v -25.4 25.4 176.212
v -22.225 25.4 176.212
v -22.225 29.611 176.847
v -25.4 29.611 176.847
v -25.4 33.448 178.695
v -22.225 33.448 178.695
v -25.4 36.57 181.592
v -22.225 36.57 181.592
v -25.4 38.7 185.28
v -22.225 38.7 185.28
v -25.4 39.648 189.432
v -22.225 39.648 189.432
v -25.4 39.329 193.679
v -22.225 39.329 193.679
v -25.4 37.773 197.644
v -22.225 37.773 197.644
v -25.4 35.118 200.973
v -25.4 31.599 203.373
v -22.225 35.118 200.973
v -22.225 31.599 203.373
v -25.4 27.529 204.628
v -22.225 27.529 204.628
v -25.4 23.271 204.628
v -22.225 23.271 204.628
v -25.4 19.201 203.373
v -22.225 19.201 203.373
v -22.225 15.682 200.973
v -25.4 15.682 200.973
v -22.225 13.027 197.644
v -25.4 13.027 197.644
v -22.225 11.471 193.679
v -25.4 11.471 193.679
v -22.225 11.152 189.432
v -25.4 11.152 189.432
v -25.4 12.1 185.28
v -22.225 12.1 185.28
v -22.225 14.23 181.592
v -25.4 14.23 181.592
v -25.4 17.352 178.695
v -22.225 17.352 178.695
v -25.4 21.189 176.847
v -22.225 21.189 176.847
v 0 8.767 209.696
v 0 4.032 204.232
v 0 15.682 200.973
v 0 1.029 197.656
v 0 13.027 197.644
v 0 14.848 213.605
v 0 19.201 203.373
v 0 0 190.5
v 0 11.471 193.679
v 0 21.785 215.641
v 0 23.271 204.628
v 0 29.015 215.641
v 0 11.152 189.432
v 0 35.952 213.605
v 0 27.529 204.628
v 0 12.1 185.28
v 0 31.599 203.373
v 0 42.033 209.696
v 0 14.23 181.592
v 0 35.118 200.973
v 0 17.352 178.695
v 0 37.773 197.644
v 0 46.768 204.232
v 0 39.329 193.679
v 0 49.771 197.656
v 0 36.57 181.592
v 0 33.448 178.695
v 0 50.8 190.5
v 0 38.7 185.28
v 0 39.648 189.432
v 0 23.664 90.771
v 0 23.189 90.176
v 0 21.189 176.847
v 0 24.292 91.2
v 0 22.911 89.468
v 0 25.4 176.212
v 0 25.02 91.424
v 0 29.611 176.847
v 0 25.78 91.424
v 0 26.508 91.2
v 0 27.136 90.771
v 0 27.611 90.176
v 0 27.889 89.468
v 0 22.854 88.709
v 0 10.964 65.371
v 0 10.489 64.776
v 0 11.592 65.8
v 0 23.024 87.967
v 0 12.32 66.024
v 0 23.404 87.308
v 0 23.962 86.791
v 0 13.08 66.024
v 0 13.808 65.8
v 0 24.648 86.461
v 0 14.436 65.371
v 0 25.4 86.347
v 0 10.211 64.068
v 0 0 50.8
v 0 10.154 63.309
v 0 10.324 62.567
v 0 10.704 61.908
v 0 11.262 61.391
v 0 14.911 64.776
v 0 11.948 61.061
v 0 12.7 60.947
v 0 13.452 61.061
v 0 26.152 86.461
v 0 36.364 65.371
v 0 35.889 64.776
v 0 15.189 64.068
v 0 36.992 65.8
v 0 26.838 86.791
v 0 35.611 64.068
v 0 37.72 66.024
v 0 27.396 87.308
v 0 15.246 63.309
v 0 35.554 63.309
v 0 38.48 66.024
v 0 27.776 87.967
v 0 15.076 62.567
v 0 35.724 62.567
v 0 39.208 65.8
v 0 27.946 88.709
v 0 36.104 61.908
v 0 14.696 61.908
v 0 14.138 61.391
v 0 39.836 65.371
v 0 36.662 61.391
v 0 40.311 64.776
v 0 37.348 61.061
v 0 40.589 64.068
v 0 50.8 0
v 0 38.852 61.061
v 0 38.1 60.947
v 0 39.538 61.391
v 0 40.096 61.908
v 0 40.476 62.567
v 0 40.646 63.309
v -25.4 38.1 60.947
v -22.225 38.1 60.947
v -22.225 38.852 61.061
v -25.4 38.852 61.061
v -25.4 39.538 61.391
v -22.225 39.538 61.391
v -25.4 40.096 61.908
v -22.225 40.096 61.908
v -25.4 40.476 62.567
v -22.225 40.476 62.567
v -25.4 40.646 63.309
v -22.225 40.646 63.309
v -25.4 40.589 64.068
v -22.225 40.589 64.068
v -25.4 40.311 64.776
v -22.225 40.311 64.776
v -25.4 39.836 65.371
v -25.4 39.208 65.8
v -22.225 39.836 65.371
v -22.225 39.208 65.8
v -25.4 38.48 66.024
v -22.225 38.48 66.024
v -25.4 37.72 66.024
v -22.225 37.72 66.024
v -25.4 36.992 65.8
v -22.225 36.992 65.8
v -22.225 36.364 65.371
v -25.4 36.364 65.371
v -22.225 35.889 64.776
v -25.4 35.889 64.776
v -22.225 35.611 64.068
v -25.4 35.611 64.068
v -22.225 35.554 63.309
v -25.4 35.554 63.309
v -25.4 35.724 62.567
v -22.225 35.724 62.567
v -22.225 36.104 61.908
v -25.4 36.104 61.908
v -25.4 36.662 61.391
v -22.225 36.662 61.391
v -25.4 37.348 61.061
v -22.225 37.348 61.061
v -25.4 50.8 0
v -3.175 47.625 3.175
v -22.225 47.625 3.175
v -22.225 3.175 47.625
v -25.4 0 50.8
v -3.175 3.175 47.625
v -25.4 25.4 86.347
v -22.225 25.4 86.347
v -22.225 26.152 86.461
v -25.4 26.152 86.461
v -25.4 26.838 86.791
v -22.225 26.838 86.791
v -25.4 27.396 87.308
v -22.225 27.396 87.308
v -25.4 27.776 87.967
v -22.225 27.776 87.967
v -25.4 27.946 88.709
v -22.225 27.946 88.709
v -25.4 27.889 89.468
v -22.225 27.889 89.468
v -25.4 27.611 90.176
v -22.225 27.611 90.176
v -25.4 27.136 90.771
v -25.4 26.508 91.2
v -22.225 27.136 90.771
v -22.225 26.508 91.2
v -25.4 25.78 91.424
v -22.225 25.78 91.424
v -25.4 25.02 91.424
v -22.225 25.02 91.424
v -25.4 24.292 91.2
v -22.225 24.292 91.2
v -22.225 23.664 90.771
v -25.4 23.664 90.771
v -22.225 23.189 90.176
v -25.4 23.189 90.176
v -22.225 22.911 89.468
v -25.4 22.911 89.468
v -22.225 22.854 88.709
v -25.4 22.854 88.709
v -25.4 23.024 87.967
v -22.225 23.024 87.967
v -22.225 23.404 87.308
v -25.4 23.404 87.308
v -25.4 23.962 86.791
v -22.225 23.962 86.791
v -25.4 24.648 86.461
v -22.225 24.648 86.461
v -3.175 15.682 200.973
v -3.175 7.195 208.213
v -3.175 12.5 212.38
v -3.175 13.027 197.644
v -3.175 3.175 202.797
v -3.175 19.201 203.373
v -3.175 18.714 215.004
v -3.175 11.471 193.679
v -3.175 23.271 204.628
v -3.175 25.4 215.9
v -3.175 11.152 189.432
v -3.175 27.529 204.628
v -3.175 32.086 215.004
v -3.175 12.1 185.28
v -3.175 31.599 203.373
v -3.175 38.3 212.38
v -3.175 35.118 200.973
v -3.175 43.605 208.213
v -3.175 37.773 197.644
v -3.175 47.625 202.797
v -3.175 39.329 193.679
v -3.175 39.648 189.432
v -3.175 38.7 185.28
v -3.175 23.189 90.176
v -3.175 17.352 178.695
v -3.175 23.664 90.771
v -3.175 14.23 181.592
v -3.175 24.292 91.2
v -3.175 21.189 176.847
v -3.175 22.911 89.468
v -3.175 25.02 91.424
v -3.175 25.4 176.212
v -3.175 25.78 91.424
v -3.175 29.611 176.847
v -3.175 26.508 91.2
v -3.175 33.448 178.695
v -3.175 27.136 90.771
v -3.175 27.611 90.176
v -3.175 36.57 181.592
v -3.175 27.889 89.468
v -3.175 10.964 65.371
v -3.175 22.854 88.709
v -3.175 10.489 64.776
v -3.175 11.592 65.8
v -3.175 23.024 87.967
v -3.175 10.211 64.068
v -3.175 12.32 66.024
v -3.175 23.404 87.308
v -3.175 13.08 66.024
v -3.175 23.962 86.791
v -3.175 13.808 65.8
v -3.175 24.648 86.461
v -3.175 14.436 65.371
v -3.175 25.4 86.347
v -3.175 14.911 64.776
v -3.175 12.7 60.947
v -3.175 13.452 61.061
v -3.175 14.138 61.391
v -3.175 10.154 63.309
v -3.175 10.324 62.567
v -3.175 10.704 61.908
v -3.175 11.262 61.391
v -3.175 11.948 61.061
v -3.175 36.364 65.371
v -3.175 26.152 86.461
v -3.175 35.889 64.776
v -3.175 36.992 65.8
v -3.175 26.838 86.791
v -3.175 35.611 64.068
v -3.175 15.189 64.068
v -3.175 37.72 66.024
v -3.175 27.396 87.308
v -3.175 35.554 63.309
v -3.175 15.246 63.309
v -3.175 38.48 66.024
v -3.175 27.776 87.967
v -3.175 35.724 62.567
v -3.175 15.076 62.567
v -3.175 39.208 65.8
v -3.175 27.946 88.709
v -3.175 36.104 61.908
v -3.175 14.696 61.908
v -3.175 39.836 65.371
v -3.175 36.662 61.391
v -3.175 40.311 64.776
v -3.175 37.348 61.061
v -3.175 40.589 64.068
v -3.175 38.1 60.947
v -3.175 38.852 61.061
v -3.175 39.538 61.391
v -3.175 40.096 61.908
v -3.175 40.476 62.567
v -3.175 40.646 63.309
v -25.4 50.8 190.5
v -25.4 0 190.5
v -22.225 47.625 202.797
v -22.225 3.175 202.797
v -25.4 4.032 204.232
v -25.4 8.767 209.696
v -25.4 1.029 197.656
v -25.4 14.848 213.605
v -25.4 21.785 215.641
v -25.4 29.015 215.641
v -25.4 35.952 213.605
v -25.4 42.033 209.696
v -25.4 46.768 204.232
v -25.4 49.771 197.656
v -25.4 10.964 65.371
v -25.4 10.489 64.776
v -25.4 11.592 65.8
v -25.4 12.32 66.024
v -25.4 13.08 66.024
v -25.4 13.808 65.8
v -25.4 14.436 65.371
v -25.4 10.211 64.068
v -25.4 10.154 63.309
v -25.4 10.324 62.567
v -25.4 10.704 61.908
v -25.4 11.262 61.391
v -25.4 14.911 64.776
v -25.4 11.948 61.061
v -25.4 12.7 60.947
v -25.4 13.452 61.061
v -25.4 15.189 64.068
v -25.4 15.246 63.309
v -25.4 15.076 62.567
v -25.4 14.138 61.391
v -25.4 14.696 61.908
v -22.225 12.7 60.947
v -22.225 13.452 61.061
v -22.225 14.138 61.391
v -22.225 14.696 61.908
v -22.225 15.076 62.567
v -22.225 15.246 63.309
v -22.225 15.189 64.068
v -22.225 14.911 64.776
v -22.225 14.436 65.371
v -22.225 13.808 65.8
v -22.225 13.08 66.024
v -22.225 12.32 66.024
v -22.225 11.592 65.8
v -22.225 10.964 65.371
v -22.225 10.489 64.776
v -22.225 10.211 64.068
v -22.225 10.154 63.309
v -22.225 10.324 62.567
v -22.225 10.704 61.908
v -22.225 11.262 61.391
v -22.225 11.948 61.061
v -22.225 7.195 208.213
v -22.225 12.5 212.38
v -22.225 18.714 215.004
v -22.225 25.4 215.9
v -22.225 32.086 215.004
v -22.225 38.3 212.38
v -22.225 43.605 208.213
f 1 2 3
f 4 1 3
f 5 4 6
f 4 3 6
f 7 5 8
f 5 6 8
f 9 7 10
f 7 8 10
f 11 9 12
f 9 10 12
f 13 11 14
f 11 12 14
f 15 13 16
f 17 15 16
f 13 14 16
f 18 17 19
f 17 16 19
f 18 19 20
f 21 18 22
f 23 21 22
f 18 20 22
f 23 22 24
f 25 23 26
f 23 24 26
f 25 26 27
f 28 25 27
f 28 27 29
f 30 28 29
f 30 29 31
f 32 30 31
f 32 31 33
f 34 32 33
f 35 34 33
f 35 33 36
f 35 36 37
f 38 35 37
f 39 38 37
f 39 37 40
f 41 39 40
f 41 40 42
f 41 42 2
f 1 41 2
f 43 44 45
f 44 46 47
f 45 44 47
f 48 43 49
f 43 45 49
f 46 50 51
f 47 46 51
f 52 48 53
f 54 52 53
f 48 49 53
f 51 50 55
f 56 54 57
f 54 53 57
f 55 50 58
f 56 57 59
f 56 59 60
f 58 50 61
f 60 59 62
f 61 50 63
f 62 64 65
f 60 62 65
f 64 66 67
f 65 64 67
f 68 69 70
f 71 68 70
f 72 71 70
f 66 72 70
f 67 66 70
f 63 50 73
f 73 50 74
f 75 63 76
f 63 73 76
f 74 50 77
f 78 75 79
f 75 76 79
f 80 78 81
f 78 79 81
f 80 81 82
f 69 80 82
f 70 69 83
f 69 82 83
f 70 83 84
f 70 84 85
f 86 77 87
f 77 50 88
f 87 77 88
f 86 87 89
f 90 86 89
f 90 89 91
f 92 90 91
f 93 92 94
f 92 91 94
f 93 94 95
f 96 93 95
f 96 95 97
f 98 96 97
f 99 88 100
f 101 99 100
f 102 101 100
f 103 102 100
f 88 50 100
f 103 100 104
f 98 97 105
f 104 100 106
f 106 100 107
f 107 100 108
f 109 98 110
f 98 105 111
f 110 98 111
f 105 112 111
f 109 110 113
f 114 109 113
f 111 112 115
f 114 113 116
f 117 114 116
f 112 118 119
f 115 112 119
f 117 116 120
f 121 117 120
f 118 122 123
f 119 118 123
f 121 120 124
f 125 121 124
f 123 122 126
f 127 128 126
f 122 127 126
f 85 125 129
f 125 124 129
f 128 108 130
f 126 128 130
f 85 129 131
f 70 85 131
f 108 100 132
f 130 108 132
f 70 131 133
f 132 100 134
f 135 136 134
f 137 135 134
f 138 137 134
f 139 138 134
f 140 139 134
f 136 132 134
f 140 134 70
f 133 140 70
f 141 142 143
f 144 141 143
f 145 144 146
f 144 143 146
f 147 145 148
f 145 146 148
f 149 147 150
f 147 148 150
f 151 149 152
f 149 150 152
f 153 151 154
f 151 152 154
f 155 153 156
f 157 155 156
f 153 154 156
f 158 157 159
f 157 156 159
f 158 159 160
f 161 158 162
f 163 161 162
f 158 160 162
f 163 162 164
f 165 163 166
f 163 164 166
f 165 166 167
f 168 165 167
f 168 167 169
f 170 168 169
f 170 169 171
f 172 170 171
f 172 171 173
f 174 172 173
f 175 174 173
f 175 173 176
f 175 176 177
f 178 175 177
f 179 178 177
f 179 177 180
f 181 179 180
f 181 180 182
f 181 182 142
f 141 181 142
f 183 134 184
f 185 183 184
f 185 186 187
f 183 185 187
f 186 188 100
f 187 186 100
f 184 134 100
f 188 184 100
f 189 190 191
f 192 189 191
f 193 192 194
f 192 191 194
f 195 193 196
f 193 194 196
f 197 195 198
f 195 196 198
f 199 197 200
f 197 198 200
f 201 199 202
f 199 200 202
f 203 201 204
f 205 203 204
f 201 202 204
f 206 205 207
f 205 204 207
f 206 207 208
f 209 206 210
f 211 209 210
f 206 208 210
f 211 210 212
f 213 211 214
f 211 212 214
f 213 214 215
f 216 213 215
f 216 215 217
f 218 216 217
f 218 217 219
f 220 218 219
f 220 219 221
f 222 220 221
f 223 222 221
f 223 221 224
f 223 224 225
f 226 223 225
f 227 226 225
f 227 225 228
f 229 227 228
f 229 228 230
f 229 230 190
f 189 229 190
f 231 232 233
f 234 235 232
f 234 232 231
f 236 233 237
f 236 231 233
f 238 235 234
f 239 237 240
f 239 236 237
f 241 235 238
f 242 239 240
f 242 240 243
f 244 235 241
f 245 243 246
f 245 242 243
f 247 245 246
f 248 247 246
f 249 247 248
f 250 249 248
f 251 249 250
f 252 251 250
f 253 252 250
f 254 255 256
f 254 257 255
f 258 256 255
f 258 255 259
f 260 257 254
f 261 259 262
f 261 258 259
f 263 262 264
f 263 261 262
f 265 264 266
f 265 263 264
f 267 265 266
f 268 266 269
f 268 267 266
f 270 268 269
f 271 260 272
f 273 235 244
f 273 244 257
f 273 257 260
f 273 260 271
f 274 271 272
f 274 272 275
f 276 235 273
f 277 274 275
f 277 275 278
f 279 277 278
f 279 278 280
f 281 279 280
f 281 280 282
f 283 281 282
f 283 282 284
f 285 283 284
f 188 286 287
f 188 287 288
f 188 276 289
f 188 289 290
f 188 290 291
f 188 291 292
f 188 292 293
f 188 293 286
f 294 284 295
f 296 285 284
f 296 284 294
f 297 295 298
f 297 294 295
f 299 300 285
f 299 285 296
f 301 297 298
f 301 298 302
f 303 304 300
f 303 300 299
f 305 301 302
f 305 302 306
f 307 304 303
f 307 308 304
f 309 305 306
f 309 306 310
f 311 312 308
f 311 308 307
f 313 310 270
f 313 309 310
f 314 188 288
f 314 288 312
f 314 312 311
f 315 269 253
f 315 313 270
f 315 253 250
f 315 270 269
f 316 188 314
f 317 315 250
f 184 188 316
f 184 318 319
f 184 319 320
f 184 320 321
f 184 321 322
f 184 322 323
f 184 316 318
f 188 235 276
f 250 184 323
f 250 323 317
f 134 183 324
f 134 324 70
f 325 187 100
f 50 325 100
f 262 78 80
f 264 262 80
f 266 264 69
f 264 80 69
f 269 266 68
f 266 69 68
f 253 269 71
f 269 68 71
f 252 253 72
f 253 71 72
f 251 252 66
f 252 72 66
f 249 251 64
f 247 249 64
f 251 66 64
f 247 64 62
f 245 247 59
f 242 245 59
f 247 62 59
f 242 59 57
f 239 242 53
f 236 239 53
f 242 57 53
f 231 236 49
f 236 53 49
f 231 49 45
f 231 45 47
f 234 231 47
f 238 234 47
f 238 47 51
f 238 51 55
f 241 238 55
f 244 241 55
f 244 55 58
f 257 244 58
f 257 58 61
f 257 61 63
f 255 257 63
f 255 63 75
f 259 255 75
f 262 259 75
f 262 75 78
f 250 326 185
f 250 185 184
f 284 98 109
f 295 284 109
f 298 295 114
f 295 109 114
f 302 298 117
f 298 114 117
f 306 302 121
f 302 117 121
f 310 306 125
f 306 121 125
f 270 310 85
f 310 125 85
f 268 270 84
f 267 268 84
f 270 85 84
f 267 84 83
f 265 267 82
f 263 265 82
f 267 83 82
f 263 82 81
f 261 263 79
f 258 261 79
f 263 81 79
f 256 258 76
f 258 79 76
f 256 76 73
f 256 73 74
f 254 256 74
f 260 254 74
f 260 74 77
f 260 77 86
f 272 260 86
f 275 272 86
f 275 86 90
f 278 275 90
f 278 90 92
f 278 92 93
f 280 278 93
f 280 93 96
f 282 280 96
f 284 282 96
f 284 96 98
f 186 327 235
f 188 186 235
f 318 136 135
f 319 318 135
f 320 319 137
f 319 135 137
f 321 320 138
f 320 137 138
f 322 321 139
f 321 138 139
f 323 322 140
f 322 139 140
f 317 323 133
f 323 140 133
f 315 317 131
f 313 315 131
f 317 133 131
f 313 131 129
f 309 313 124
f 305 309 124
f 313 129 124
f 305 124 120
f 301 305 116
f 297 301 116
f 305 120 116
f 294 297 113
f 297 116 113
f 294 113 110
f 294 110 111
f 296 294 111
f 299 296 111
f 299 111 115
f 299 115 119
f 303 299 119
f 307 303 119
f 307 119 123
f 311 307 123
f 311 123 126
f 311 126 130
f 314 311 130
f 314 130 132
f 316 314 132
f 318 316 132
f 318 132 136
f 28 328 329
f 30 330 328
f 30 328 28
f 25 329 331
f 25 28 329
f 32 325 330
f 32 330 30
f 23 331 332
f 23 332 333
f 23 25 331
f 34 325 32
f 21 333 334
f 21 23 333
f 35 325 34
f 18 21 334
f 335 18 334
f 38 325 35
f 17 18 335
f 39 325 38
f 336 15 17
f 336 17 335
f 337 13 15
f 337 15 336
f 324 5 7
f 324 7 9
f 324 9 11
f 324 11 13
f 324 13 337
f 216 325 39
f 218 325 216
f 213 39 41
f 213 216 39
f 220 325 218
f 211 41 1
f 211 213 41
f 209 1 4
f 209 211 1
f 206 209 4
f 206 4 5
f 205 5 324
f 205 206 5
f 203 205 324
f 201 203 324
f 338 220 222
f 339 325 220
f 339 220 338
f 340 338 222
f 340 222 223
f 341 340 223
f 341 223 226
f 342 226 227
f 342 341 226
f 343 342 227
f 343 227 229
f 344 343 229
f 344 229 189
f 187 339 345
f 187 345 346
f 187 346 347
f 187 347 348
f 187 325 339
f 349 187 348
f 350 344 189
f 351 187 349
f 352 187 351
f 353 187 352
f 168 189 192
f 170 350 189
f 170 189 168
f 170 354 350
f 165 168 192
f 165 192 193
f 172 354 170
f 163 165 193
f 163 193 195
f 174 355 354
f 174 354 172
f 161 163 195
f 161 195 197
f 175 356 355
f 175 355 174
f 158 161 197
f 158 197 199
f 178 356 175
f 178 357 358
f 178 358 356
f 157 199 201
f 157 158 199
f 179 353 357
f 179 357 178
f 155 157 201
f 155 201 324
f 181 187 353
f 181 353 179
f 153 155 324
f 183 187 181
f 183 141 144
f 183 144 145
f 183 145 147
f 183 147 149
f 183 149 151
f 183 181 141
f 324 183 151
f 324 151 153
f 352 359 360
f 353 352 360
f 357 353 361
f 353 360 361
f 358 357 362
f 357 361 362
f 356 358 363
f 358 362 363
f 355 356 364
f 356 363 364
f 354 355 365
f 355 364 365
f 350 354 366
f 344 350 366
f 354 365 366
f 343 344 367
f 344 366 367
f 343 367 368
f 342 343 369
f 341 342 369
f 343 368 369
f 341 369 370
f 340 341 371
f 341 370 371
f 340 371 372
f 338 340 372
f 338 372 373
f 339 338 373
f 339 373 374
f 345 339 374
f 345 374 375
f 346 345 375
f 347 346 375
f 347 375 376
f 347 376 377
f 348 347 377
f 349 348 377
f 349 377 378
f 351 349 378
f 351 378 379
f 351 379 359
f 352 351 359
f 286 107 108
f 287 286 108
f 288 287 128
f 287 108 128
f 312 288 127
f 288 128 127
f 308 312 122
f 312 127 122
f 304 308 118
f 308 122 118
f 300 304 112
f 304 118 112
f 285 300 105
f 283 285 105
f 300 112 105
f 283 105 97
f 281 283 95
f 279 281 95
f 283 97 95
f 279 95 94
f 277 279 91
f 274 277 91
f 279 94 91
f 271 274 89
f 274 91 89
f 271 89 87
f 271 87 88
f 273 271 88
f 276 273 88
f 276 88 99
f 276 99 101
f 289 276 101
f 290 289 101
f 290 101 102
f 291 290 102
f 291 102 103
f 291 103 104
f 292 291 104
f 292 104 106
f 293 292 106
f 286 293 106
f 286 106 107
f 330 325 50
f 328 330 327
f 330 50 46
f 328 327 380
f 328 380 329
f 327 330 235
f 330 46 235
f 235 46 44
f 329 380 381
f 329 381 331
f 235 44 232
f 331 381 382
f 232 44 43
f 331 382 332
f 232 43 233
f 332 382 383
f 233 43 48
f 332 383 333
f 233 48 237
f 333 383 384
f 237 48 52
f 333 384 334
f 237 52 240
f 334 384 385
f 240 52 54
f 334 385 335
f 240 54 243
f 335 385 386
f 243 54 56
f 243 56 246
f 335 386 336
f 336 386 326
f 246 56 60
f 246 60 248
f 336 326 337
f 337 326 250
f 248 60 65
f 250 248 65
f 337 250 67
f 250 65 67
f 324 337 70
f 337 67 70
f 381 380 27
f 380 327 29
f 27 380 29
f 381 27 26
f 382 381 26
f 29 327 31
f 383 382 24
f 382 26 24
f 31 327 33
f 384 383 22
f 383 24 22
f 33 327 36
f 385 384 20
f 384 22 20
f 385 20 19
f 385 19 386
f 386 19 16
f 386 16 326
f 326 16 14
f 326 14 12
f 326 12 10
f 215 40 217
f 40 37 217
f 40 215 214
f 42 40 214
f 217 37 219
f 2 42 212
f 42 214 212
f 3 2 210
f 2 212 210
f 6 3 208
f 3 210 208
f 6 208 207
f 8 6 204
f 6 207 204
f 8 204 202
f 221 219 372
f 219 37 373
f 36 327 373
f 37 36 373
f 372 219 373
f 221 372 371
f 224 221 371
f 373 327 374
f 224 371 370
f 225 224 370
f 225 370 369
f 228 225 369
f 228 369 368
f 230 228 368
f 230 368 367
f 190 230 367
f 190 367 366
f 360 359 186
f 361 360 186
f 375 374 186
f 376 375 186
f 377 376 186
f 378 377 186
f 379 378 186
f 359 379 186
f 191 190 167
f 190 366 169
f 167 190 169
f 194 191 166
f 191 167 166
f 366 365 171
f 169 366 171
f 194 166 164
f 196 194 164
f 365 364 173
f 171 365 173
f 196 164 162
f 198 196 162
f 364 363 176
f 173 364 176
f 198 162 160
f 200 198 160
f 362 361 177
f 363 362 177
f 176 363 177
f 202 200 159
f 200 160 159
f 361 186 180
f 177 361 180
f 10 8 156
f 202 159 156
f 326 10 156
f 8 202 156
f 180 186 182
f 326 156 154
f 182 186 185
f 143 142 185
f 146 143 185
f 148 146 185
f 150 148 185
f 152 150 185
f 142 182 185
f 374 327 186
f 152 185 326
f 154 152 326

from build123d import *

# Parameters (mm, degrees)
SKETCH1_W               = 25.4
SKETCH1_H               = 50.8
SKETCH1_W_2             = 19.05
SKETCH1_H_2             = 44.45
BOSS_EXTRUDE1_DEPTH     = 215.9
CUT_EXTRUDE1_DEPTH      = 25.4
SKETCH3_R               = 2.5527
CUT_EXTRUDE2_DEPTH      = 25.4
CUT_EXTRUDE_THIN1_DEPTH = 26.4
SKETCH7_R               = 14.2875
CUT_EXTRUDE3_DEPTH      = 25.4


with BuildPart() as part:
    # Sketch1 → Boss-Extrude1 (new body)
    with BuildSketch(Plane.XY):
        with Locations((-12.7, 25.4)):
            Rectangle(SKETCH1_W, SKETCH1_H)
        with Locations((-12.7, 25.4)):
            Rectangle(SKETCH1_W_2, SKETCH1_H_2, mode=Mode.SUBTRACT)
    extrude(amount=BOSS_EXTRUDE1_DEPTH)

    # Sketch2 → Cut-Extrude1 (cut)
    with BuildSketch(Plane(origin=(0, 0, 0), x_dir=(0, 0, -1), z_dir=(1, 0, 0))):
        Polygon((0, 50.8), (-50.8, 0), (0, 0), align=None)
    extrude(amount=-CUT_EXTRUDE1_DEPTH, mode=Mode.SUBTRACT)

    # Sketch3 → Cut-Extrude2 (cut)
    with BuildSketch(Plane(origin=(0, 0, 0), x_dir=(0, 0, -1), z_dir=(1, 0, 0))):
        with Locations((-63.5, 38.1)):
            Circle(SKETCH3_R)
        with Locations((-63.5, 12.7)):
            Circle(SKETCH3_R)
        with Locations((-88.9, 25.4)):
            Circle(SKETCH3_R)
    extrude(amount=-CUT_EXTRUDE2_DEPTH, mode=Mode.SUBTRACT)

    # Sketch6 → Cut-Extrude-Thin1 (cut, through all)
    with BuildSketch(Plane(origin=(0, 0, 0), x_dir=(0, 0, -1), z_dir=(1, 0, 0))):
        with BuildLine():
            ThreePointArc((-190.5, 0), (-215.9, 25.4), (-190.5, 50.8))
            Line((-190.5, 50.8), (-190.5, 63.5))
            ThreePointArc((-190.5, 63.5), (-228.6, 25.4), (-190.5, -12.7))
            Line((-190.5, -12.7), (-190.5, 0))
        make_face()
    extrude(amount=-CUT_EXTRUDE_THIN1_DEPTH, mode=Mode.SUBTRACT)

    # Sketch7 → Cut-Extrude3 (cut)
    with BuildSketch(Plane(origin=(0, 0, 0), x_dir=(0, 0, -1), z_dir=(1, 0, 0))):
        with Locations((-190.5, 25.4)):
            Circle(SKETCH7_R)
    extrude(amount=-CUT_EXTRUDE3_DEPTH, mode=Mode.SUBTRACT)


solid = part.part
